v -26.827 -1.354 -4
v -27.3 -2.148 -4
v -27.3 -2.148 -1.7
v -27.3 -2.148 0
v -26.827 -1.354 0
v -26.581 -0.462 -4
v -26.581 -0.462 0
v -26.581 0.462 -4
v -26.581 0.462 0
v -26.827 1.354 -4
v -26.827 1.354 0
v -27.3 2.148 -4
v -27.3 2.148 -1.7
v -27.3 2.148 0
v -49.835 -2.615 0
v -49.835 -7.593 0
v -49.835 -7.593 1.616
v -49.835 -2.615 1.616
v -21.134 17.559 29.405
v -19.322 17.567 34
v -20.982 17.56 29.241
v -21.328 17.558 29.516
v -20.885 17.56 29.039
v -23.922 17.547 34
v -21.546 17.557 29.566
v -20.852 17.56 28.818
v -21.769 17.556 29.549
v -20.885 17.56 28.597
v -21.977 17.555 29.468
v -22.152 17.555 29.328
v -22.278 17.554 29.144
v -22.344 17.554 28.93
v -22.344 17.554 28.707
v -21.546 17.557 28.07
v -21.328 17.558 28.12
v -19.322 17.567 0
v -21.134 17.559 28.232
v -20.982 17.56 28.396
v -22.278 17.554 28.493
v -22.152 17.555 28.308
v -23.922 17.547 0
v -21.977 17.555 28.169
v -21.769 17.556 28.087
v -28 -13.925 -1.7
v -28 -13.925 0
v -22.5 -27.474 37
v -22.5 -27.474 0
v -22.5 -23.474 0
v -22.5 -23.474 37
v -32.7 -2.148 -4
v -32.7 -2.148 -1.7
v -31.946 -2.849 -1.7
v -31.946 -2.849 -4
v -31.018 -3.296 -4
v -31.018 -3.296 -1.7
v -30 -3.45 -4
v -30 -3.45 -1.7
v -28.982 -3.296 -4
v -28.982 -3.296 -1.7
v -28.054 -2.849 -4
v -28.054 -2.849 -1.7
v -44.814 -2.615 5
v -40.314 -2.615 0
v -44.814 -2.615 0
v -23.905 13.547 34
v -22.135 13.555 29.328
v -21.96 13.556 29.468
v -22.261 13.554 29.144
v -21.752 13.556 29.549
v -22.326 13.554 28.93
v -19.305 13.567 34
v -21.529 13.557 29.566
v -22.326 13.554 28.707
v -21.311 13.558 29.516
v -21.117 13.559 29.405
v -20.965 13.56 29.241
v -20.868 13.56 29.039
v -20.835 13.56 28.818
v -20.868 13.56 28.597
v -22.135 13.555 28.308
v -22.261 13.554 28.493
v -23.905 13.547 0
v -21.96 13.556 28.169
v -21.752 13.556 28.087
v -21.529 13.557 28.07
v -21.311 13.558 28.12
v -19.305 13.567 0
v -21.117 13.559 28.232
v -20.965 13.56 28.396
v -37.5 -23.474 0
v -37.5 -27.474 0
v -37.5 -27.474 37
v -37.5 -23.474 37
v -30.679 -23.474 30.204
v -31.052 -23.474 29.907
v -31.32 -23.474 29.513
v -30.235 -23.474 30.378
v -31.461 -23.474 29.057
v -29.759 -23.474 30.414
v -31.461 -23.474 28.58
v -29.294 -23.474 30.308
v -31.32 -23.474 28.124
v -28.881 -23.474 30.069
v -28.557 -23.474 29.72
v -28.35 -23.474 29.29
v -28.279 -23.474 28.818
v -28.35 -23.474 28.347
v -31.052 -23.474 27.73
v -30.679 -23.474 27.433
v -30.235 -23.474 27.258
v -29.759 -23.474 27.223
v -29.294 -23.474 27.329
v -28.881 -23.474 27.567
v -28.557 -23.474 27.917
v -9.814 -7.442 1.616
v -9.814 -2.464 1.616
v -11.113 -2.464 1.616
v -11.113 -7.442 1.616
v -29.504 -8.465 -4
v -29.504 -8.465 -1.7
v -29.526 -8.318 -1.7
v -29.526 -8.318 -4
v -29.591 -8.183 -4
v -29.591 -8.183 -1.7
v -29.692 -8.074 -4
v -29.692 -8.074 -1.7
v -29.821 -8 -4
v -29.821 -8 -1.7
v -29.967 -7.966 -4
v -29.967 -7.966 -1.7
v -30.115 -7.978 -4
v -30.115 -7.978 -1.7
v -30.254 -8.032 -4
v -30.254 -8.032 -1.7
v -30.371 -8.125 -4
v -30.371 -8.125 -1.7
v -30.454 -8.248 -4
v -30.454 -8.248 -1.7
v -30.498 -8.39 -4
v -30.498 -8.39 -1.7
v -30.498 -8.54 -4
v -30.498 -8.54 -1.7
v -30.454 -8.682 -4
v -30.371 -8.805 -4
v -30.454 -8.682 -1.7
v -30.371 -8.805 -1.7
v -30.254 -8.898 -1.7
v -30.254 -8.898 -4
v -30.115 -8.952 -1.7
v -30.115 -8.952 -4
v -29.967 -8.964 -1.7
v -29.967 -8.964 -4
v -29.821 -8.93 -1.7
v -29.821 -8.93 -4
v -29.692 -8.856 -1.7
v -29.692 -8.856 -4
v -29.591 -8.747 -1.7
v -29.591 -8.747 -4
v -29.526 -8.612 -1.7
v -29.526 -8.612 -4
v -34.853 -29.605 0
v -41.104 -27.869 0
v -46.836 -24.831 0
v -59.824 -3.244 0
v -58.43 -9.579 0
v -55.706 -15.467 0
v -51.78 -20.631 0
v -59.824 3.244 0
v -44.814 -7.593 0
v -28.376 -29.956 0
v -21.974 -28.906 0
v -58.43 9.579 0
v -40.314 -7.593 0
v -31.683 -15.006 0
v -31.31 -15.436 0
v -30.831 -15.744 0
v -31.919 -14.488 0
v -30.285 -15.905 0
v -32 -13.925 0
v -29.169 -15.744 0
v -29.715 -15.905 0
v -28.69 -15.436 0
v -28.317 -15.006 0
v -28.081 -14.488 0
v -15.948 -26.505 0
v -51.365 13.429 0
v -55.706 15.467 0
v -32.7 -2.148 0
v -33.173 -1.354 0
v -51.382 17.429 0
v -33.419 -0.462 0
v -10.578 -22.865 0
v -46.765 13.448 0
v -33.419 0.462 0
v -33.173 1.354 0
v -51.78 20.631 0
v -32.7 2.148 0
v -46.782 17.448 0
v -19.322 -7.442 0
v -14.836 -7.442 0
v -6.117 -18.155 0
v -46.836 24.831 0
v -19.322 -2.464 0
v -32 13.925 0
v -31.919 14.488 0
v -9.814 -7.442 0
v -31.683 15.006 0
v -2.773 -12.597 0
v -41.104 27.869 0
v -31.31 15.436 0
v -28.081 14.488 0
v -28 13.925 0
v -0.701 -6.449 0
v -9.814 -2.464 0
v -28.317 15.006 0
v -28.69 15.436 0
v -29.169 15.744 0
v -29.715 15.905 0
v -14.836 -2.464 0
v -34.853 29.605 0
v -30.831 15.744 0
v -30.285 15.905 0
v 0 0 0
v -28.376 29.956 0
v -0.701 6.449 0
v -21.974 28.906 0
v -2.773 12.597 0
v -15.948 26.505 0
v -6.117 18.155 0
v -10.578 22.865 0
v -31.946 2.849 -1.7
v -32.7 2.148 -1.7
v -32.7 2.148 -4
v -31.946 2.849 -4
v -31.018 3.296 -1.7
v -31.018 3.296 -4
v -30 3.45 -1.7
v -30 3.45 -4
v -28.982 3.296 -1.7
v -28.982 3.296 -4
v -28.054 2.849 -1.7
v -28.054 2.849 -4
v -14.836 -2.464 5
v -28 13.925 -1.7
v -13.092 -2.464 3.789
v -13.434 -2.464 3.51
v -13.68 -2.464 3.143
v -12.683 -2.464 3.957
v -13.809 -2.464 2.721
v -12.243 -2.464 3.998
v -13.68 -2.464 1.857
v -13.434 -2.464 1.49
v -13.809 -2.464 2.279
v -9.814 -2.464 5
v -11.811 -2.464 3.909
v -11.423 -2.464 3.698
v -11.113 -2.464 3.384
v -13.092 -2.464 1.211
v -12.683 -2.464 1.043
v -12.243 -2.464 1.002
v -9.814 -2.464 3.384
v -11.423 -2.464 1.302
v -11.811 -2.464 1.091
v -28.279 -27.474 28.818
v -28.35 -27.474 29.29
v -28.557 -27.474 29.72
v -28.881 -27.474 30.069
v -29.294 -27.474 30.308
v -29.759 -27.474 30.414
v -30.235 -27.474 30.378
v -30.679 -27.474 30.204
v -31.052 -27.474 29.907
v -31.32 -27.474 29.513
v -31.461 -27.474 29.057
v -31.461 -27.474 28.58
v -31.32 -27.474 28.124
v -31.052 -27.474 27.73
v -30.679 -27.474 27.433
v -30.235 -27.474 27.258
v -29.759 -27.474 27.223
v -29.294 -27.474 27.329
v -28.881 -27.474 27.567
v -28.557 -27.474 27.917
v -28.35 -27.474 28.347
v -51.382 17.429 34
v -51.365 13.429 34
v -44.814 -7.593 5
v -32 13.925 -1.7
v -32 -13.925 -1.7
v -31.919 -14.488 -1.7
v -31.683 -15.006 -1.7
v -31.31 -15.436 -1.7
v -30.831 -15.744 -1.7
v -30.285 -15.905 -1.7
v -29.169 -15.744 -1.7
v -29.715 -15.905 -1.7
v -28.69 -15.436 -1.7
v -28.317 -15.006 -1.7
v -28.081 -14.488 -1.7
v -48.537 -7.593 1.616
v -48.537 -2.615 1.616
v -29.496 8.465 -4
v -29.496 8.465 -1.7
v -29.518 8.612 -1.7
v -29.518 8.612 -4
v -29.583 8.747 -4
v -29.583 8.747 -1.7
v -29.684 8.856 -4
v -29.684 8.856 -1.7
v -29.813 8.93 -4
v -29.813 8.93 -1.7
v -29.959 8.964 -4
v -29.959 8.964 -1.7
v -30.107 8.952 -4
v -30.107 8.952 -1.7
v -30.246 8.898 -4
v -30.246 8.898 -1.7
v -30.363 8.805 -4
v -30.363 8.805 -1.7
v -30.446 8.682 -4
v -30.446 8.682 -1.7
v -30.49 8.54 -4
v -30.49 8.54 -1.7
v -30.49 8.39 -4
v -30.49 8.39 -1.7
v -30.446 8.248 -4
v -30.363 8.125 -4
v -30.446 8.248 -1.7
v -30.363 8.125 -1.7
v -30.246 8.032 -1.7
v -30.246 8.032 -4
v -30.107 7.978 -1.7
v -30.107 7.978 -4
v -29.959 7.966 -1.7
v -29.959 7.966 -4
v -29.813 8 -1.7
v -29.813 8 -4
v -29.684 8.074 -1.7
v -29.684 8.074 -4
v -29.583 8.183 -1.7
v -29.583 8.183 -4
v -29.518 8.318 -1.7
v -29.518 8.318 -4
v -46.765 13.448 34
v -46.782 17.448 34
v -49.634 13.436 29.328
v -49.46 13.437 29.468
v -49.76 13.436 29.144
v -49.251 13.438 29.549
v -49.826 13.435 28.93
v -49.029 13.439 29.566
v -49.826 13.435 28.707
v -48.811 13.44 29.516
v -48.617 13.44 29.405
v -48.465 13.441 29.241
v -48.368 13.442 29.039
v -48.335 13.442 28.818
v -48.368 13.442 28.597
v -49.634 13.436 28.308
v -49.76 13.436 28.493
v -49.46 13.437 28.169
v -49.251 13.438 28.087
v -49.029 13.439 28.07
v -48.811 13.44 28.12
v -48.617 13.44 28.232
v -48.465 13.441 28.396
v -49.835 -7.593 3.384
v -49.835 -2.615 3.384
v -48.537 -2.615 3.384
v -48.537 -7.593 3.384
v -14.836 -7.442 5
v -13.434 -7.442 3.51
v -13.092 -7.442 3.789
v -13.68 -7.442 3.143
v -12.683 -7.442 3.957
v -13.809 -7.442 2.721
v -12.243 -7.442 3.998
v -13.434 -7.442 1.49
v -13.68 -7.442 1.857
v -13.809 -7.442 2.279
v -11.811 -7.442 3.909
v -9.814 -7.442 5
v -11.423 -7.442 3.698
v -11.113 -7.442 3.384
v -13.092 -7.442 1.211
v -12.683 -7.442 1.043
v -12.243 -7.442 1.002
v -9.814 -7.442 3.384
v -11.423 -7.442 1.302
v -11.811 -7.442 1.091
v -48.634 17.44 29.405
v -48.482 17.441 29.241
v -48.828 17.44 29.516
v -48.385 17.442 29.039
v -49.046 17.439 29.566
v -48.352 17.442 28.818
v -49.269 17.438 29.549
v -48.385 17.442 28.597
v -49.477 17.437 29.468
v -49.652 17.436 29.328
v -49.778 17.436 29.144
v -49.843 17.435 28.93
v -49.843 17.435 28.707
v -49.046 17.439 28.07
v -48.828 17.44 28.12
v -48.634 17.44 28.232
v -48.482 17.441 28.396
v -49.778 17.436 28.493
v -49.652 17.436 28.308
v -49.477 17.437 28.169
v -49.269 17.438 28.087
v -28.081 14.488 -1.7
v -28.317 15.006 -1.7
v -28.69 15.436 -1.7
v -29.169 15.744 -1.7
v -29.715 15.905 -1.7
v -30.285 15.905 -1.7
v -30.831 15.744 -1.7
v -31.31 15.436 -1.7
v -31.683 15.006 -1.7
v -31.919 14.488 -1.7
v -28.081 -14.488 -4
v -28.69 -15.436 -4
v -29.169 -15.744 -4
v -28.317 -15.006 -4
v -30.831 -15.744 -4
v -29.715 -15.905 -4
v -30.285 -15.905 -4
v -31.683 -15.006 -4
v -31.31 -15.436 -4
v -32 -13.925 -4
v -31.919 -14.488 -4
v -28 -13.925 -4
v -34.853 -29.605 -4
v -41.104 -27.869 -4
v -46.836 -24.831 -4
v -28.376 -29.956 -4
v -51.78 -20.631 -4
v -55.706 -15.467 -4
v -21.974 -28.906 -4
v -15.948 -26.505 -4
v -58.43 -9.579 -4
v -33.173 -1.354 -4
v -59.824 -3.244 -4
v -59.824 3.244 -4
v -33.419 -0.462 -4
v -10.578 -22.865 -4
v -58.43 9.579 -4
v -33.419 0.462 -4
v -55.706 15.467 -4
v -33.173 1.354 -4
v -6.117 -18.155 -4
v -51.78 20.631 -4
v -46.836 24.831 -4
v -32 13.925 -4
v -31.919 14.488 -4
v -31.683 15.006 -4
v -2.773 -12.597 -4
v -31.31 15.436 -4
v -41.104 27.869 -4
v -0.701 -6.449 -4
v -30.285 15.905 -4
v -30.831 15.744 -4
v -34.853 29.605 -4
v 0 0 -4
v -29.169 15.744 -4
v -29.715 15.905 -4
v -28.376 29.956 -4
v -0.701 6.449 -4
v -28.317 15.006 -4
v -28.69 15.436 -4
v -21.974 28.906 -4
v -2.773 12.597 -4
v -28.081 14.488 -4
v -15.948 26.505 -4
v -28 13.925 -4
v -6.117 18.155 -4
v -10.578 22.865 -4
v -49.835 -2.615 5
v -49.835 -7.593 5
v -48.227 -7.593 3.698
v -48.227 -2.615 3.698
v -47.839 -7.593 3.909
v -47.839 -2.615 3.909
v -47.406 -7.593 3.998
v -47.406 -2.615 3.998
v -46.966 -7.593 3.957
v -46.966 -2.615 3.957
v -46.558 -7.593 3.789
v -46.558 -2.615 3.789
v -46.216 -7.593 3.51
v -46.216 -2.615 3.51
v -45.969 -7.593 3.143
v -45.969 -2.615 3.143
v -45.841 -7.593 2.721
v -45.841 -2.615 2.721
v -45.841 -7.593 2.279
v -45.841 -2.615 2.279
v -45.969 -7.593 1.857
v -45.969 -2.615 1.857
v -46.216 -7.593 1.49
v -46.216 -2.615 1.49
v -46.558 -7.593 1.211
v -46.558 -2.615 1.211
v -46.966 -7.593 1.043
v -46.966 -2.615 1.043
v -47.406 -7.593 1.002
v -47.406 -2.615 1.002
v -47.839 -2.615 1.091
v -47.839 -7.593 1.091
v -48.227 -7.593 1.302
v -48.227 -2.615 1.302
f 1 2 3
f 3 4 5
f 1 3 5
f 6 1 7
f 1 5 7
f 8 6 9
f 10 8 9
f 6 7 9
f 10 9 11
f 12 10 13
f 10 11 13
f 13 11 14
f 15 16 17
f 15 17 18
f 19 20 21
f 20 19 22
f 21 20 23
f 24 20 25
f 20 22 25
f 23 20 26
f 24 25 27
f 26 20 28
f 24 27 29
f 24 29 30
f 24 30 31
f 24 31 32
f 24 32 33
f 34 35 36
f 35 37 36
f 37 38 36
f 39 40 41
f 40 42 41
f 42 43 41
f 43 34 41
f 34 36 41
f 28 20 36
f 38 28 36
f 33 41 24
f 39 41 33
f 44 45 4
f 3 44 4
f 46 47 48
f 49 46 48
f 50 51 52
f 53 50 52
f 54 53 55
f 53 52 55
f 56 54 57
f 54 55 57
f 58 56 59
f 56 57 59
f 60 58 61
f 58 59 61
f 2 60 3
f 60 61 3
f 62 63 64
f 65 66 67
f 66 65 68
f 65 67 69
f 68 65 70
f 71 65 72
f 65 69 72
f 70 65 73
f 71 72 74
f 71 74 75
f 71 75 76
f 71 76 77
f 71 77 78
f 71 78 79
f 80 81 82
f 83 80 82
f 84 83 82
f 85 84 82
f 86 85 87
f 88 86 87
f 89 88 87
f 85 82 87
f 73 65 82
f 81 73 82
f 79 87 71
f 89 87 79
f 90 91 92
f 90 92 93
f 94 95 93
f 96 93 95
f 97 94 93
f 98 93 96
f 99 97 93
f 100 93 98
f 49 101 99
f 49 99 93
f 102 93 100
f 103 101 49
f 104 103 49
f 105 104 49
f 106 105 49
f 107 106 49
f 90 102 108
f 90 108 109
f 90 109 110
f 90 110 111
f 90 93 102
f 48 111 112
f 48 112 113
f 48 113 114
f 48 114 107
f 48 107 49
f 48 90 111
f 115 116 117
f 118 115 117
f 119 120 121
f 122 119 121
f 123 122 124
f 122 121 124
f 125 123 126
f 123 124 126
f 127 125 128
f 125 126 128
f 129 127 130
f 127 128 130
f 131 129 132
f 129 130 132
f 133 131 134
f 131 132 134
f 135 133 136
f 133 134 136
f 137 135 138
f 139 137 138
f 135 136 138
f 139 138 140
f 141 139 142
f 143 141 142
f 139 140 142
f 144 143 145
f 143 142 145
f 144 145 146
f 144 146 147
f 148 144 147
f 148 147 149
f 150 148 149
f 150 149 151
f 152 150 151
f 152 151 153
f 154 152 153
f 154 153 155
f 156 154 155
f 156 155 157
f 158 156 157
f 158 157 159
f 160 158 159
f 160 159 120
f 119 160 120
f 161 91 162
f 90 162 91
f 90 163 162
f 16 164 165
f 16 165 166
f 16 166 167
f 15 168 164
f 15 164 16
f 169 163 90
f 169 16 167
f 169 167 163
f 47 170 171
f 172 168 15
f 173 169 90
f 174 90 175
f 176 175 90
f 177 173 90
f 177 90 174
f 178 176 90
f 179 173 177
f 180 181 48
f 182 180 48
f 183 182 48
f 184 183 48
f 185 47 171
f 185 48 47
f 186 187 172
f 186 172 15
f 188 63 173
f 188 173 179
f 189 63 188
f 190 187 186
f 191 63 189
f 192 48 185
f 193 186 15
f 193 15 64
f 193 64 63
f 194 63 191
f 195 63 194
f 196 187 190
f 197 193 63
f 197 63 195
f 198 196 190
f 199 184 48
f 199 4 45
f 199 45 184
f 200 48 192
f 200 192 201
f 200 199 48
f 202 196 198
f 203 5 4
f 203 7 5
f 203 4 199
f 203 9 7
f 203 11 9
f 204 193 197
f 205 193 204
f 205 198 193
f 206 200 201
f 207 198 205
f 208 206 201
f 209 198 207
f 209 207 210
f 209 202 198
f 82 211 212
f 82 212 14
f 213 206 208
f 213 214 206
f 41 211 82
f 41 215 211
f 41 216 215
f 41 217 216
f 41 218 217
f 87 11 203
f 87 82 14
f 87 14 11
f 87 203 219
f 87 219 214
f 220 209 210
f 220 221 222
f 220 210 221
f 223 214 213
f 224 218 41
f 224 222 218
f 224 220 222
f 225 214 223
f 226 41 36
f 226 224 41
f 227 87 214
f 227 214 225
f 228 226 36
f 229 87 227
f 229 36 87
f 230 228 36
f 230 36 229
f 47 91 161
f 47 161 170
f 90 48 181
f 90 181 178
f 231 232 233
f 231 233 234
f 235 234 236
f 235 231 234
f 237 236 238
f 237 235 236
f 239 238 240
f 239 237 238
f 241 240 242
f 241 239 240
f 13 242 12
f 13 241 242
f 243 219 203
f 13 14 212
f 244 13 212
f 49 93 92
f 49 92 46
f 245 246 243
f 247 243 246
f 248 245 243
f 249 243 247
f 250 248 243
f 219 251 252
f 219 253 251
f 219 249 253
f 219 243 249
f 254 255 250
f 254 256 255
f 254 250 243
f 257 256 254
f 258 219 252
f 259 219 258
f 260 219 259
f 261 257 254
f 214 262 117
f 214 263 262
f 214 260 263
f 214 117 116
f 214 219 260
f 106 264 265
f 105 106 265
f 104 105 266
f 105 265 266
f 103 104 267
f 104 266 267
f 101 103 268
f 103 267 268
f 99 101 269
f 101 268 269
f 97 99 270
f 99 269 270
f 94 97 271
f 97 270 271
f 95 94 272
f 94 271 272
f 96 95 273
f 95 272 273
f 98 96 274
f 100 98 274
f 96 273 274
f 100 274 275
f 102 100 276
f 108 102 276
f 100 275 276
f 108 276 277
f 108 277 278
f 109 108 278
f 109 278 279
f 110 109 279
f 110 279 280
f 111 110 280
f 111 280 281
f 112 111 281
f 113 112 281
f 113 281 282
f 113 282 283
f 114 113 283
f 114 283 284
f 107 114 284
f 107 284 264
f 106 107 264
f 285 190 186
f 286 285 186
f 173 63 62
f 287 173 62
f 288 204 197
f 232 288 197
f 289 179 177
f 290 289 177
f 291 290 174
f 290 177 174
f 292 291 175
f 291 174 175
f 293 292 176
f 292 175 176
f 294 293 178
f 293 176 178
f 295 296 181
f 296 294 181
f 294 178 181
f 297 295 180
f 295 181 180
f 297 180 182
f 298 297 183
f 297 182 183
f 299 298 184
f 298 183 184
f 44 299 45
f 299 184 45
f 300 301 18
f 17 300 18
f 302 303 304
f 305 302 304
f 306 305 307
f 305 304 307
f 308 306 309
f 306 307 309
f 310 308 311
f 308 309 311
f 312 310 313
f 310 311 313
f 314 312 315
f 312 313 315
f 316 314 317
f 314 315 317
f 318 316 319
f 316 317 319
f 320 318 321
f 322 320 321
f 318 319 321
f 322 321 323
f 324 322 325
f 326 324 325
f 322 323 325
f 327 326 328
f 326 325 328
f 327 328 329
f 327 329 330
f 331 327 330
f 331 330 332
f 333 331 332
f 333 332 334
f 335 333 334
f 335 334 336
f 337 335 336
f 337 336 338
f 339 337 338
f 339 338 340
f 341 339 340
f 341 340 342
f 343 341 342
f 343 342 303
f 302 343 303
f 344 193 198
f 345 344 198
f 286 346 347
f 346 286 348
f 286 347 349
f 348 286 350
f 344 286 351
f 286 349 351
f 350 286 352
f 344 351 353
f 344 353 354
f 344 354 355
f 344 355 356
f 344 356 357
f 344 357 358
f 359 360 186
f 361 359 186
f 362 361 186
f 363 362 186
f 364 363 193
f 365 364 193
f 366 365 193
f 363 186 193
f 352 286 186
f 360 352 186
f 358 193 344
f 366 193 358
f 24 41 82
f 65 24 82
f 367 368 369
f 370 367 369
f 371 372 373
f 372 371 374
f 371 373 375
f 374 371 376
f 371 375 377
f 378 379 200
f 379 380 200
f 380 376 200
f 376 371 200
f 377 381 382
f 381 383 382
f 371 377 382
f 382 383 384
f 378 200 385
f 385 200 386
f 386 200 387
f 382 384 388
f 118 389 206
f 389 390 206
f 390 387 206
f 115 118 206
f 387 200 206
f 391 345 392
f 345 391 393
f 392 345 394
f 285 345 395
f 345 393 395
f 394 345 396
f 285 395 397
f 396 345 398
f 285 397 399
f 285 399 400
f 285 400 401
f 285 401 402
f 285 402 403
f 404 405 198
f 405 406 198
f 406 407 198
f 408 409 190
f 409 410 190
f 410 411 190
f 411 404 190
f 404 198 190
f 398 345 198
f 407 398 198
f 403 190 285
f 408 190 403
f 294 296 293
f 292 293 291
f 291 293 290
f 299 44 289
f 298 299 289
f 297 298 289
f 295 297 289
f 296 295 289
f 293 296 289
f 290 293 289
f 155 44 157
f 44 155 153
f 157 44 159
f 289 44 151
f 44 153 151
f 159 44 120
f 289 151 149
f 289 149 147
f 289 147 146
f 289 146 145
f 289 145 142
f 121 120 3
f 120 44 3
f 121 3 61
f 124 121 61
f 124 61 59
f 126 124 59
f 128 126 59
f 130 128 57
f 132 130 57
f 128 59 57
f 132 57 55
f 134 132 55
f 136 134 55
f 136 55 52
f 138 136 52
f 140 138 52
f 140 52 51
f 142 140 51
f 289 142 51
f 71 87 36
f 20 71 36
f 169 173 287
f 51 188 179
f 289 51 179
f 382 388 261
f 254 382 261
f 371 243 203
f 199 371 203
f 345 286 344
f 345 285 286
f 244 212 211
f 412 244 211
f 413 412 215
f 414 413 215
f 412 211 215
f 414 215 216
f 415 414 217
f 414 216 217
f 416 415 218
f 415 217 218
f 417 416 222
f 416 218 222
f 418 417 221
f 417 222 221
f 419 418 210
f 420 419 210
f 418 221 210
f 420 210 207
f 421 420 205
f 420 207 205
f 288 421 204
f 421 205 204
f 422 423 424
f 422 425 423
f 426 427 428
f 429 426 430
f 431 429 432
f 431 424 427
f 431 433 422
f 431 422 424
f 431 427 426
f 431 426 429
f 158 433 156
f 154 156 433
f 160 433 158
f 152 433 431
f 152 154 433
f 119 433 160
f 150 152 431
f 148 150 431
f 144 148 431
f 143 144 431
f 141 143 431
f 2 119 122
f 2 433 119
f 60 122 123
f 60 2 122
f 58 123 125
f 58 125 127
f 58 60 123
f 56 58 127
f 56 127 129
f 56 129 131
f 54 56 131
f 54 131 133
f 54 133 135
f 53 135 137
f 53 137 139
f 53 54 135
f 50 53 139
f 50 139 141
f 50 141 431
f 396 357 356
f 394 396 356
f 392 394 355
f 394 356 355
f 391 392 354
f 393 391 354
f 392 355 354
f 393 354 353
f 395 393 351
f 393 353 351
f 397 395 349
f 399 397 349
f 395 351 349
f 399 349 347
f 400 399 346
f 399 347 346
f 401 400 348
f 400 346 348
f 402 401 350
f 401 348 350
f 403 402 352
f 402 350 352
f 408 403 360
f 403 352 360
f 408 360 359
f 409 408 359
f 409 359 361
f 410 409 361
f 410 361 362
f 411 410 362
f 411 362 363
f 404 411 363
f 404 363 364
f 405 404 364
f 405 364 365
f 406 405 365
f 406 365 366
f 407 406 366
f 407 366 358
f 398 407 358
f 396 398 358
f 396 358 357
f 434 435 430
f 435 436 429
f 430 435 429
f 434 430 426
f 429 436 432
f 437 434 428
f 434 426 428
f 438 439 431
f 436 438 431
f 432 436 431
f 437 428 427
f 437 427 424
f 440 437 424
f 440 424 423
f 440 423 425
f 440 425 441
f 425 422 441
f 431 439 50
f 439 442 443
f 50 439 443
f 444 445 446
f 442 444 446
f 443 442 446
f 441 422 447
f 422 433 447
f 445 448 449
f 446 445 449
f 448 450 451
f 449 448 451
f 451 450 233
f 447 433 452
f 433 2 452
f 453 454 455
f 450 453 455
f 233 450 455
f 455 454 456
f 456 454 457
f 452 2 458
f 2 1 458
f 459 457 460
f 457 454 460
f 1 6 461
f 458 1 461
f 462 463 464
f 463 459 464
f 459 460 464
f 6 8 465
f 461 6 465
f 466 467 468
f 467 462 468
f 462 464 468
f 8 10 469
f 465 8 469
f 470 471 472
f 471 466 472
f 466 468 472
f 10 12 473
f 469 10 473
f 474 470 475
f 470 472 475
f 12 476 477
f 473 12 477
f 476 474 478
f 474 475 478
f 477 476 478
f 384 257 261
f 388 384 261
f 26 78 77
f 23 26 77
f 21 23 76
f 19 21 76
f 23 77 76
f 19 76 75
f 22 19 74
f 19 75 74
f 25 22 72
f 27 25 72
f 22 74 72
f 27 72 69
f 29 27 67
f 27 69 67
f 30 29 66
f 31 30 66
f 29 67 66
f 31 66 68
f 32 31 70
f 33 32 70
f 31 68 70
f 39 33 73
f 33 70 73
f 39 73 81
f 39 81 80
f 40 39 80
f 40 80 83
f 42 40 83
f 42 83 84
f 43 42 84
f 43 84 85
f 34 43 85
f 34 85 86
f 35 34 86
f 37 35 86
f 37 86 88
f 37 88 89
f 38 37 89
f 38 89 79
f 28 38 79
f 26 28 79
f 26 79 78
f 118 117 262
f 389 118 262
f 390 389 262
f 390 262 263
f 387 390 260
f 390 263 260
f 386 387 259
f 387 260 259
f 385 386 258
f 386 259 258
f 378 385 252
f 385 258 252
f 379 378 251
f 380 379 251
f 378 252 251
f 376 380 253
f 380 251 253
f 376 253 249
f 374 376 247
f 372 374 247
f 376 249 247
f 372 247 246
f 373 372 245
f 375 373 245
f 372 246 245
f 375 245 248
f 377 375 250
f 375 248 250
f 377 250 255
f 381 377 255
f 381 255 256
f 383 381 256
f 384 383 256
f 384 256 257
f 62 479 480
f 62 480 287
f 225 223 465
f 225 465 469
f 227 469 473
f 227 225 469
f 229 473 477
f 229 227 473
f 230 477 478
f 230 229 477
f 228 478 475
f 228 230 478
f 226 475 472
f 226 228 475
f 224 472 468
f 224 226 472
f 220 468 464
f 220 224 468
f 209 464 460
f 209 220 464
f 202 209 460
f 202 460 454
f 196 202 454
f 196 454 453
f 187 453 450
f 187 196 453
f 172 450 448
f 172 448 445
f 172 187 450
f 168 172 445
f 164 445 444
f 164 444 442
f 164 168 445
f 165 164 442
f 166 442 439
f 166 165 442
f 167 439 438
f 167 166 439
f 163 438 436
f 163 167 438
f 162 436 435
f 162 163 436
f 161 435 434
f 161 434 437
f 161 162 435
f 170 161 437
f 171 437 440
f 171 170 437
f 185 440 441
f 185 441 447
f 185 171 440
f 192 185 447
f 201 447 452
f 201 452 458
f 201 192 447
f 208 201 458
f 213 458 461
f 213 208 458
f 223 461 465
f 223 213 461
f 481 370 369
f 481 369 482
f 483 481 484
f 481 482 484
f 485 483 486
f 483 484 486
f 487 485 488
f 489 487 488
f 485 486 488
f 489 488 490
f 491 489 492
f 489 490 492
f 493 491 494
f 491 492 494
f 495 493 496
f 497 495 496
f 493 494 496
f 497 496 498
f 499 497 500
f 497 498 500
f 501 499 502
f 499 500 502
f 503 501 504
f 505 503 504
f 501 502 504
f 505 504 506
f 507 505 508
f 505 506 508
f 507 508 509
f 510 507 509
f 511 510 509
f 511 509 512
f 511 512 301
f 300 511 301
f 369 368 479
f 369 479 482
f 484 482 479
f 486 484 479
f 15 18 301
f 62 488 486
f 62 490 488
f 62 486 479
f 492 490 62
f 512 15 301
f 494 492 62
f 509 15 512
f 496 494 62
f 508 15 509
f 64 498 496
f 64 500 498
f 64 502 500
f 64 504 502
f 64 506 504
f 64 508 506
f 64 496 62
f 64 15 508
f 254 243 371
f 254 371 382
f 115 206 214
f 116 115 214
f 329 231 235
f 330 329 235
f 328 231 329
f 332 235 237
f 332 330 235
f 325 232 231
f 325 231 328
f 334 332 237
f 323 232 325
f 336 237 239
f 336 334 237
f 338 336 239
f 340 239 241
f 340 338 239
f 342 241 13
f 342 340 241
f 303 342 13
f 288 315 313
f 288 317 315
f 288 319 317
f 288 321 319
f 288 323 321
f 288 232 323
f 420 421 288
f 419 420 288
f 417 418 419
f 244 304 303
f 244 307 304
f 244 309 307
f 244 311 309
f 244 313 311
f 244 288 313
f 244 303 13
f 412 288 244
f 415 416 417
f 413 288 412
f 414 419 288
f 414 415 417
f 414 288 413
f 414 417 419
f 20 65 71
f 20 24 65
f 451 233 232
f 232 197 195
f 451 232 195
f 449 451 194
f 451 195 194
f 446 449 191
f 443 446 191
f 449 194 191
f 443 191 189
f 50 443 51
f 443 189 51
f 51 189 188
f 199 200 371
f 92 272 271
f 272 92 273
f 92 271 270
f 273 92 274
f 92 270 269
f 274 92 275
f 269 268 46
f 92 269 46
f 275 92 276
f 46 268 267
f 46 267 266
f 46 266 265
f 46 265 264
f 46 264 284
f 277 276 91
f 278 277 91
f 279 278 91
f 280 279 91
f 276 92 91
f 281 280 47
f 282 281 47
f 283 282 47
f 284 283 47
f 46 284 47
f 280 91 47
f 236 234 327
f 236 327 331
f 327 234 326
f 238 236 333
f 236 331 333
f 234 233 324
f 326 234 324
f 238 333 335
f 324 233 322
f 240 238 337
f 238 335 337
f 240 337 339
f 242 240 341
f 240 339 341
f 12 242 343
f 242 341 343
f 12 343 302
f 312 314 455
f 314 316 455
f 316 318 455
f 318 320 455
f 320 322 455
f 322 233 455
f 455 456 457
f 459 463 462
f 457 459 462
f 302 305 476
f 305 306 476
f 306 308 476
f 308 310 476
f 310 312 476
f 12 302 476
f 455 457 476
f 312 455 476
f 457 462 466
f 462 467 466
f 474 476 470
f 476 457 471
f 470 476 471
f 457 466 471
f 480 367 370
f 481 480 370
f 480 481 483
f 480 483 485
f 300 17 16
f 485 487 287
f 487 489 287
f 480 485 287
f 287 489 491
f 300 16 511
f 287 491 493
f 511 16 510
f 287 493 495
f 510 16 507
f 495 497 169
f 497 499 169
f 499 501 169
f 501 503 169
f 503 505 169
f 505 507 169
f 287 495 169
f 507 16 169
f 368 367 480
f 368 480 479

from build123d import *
from build123d.topology import SkipClean

# Parameters (mm, degrees)
SKETCH1_R               = 30
BOSS_EXTRUDE1_DEPTH     = 4
CUT_EXTRUDE1_DEPTH      = 68.201190865
BOSS_EXTRUDE2_START     = -2.3
BOSS_EXTRUDE2_DEPTH     = 2.3
BOSS_EXTRUDE3_DEPTH     = 34
SKETCH5_R               = 0.75
CUT_EXTRUDE2_DEPTH      = 82.573644151
SKETCH6_R               = 0.500000007
SKETCH6_R_2             = 0.5
CUT_EXTRUDE3_DEPTH      = 10
SKETCH7_W               = 15
SKETCH7_H               = 4
BOSS_EXTRUDE4_DEPTH     = 37
SKETCH8_R               = 1.6
CUT_EXTRUDE4_DEPTH      = 37
SKETCH9_W               = 5.021529313
SKETCH9_H               = 4.978377583
SKETCH9_H_2             = 4.978377584
BOSS_EXTRUDE5_DEPTH     = 5
CUT_EXTRUDE5_DEPTH      = 5
CUT_EXTRUDE5_DEPTH_BACK = 15
BOSS_EXTRUDE6_DEPTH     = 4.978377584
BOSS_EXTRUDE7_DEPTH     = 4.978377584


with BuildPart() as part:
    # Sketch1 → Boss-Extrude1 (new body)
    with BuildSketch(Plane.XY):
        with Locations((-30.000000447, 0)):
            Circle(SKETCH1_R)
    extrude(amount=-BOSS_EXTRUDE1_DEPTH)

    # Sketch2 → Cut-Extrude1 (cut, through all)
    with BuildSketch(Plane.XY):
        with BuildLine():
            Line((-32.000000447, 13.925), (-32.700000447, 2.147673159))
            ThreePointArc((-32.700000447, 2.147673159), (-33.450000447, 0), (-32.700000447, -2.147673159))
            Line((-32.700000447, -2.147673159), (-32.000000447, -13.925))
            ThreePointArc((-32.000000447, -13.925), (-30.000000447, -15.925), (-28.000000447, -13.925))
            Line((-28.000000447, -13.925), (-27.300000447, -2.147673159))
            ThreePointArc((-27.300000447, -2.147673159), (-26.550000447, 0), (-27.300000447, 2.147673159))
            Line((-27.300000447, 2.147673159), (-28.000000447, 13.925))
            ThreePointArc((-28.000000447, 13.925), (-30.000000447, 15.925), (-32.000000447, 13.925))
        make_face()
    extrude(amount=-CUT_EXTRUDE1_DEPTH, mode=Mode.SUBTRACT)

    # Sketch3 → Boss-Extrude2 (add)
    with SkipClean():  # the faces are left unmerged after this step: merging them gives an invalid solid
        with BuildSketch(Plane(origin=(0, 0, -4), x_dir=(-1, 0, 0), z_dir=(0, 0, -1)).offset(BOSS_EXTRUDE2_START)):
            with BuildLine():
                Line((27.300000447, -2.147673159), (28.000000447, -13.925))
                ThreePointArc((28.000000447, -13.925), (30.000000447, -15.925), (32.000000447, -13.925))
                Line((32.000000447, -13.925), (32.700000447, -2.147673159))
                ThreePointArc((32.700000447, -2.147673159), (30.000000447, -3.45), (27.300000447, -2.147673159))
            make_face()
            with BuildLine():
                Line((32.000000447, 13.925), (32.700000447, 2.147673159))
                ThreePointArc((32.700000447, 2.147673159), (30.000000447, 3.45), (27.300000447, 2.147673159))
                Line((27.300000447, 2.147673159), (28.000000447, 13.925))
                ThreePointArc((28.000000447, 13.925), (30.000000447, 15.925), (32.000000447, 13.925))
            make_face()
        extrude(amount=BOSS_EXTRUDE2_DEPTH)

    # Sketch4 → Boss-Extrude3 (add)
    with SkipClean():  # the faces are left unmerged after this step: merging them gives an invalid solid
        with BuildSketch(Plane.XY):
            Polygon((-23.904804701, 13.547119626), (-19.304847529, 13.566969421), (-19.32210822, 17.566932179), (-23.922065393, 17.547082384), align=None)
            Polygon((-51.364549038, 13.42862498), (-46.764591865, 13.448474775), (-46.781852557, 17.448437533), (-51.381809729, 17.428587738), align=None)
        extrude(amount=BOSS_EXTRUDE3_DEPTH)

    # Sketch5 → Cut-Extrude2 (cut, through all)
    with SkipClean():  # the faces are left unmerged after this step: merging them gives an invalid solid
        with BuildSketch(Plane(origin=(-0.058902743, 13.650019772, 0), x_dir=(0.999990689598316, 0.004315172845242606, 0), z_dir=(0.004315172845242606, -0.9999906895983162, 0))):
            with Locations((-49.026123975, 28.818298908)):
                Circle(SKETCH5_R)
            with Locations((-21.526123975, 28.818298908)):
                Circle(SKETCH5_R)
        extrude(amount=-CUT_EXTRUDE2_DEPTH, mode=Mode.SUBTRACT)

    # Sketch6 → Cut-Extrude3 (cut)
    with SkipClean():  # the faces are left unmerged after this step: merging them gives an invalid solid
        with BuildSketch(Plane.XY):
            with Locations((-30.004011834, -8.464999042)):
                Circle(SKETCH6_R)
            with Locations((-29.99598906, 8.464999042)):
                Circle(SKETCH6_R_2)
        extrude(amount=-CUT_EXTRUDE3_DEPTH, mode=Mode.SUBTRACT)

    # Sketch7 → Boss-Extrude4 (add)
    with SkipClean():  # the faces are left unmerged after this step: merging them gives an invalid solid
        with BuildSketch(Plane.XY):
            with Locations((-30.000000447, -25.474087185)):
                Rectangle(SKETCH7_W, SKETCH7_H)
        extrude(amount=BOSS_EXTRUDE4_DEPTH)

    # Sketch8 → Cut-Extrude4 (cut)
    with SkipClean():  # the faces are left unmerged after this step: merging them gives an invalid solid
        with BuildSketch(Plane.XZ.offset(27.474087185)):
            with Locations((-29.878857802, 28.818298907)):
                Circle(SKETCH8_R)
        extrude(amount=-CUT_EXTRUDE4_DEPTH, mode=Mode.SUBTRACT)

    # Sketch9 → Boss-Extrude5 (add)
    with SkipClean():  # the faces are left unmerged after this step: merging them gives an invalid solid
        with BuildSketch(Plane.XY):
            with Locations((-12.324865315, -4.953083179)):
                Rectangle(SKETCH9_W, SKETCH9_H)
            with Locations((-47.324539451, -5.104114228)):
                Rectangle(SKETCH9_W, SKETCH9_H_2)
        extrude(amount=BOSS_EXTRUDE5_DEPTH)

    # Sketch11 → Cut-Extrude5 (cut, two sides: drawn at the far end of the back side and taken through both)
    with SkipClean():  # the faces are left unmerged after this step: merging them gives an invalid solid
        with BuildSketch(Plane.XZ.offset(7.44227197).offset(-CUT_EXTRUDE5_DEPTH_BACK)):
            with BuildLine():
                Line((-9.814100658, 1.616316037), (-11.112799865, 1.616316037))
                ThreePointArc((-11.112799865, 1.616316037), (-13.824865315, 2.5), (-11.112799865, 3.383683963))
                Line((-11.112799865, 3.383683963), (-9.814100658, 3.383683963))
                Line((-9.814100658, 3.383683963), (-9.814100658, 1.616316037))
            make_face()
            with BuildLine():
                Line((-49.835304107, 3.383683963), (-48.5366049, 3.383683963))
                ThreePointArc((-48.5366049, 3.383683963), (-45.82453945, 2.5), (-48.5366049, 1.616316037))
                Line((-48.5366049, 1.616316037), (-49.835304107, 1.616316037))
                Line((-49.835304107, 1.616316037), (-49.835304107, 3.383683963))
            make_face()
        extrude(amount=CUT_EXTRUDE5_DEPTH + CUT_EXTRUDE5_DEPTH_BACK, mode=Mode.SUBTRACT)

    # Sketch12 → Boss-Extrude6 (add)
    with SkipClean():  # the faces are left unmerged after this step: merging them gives an invalid solid
        with BuildSketch(Plane(origin=(0, -2.463894387, 0), x_dir=(1, 0, 0), z_dir=(0, 1, 0))):
            Polygon((-14.835629971, -5), (-19.32210822, 0), (-14.835629971, 0), align=None)
        extrude(amount=-BOSS_EXTRUDE6_DEPTH)

    # Sketch13 → Boss-Extrude7 (add)
    with SkipClean():  # the faces are left unmerged after this step: merging them gives an invalid solid
        with BuildSketch(Plane(origin=(0, -2.614925436, 0), x_dir=(1, 0, 0), z_dir=(0, 1, 0))):
            Polygon((-44.813774794, -5), (-44.813774794, 0), (-40.313774794, 0), align=None)
        extrude(amount=-BOSS_EXTRUDE7_DEPTH)


solid = part.part
